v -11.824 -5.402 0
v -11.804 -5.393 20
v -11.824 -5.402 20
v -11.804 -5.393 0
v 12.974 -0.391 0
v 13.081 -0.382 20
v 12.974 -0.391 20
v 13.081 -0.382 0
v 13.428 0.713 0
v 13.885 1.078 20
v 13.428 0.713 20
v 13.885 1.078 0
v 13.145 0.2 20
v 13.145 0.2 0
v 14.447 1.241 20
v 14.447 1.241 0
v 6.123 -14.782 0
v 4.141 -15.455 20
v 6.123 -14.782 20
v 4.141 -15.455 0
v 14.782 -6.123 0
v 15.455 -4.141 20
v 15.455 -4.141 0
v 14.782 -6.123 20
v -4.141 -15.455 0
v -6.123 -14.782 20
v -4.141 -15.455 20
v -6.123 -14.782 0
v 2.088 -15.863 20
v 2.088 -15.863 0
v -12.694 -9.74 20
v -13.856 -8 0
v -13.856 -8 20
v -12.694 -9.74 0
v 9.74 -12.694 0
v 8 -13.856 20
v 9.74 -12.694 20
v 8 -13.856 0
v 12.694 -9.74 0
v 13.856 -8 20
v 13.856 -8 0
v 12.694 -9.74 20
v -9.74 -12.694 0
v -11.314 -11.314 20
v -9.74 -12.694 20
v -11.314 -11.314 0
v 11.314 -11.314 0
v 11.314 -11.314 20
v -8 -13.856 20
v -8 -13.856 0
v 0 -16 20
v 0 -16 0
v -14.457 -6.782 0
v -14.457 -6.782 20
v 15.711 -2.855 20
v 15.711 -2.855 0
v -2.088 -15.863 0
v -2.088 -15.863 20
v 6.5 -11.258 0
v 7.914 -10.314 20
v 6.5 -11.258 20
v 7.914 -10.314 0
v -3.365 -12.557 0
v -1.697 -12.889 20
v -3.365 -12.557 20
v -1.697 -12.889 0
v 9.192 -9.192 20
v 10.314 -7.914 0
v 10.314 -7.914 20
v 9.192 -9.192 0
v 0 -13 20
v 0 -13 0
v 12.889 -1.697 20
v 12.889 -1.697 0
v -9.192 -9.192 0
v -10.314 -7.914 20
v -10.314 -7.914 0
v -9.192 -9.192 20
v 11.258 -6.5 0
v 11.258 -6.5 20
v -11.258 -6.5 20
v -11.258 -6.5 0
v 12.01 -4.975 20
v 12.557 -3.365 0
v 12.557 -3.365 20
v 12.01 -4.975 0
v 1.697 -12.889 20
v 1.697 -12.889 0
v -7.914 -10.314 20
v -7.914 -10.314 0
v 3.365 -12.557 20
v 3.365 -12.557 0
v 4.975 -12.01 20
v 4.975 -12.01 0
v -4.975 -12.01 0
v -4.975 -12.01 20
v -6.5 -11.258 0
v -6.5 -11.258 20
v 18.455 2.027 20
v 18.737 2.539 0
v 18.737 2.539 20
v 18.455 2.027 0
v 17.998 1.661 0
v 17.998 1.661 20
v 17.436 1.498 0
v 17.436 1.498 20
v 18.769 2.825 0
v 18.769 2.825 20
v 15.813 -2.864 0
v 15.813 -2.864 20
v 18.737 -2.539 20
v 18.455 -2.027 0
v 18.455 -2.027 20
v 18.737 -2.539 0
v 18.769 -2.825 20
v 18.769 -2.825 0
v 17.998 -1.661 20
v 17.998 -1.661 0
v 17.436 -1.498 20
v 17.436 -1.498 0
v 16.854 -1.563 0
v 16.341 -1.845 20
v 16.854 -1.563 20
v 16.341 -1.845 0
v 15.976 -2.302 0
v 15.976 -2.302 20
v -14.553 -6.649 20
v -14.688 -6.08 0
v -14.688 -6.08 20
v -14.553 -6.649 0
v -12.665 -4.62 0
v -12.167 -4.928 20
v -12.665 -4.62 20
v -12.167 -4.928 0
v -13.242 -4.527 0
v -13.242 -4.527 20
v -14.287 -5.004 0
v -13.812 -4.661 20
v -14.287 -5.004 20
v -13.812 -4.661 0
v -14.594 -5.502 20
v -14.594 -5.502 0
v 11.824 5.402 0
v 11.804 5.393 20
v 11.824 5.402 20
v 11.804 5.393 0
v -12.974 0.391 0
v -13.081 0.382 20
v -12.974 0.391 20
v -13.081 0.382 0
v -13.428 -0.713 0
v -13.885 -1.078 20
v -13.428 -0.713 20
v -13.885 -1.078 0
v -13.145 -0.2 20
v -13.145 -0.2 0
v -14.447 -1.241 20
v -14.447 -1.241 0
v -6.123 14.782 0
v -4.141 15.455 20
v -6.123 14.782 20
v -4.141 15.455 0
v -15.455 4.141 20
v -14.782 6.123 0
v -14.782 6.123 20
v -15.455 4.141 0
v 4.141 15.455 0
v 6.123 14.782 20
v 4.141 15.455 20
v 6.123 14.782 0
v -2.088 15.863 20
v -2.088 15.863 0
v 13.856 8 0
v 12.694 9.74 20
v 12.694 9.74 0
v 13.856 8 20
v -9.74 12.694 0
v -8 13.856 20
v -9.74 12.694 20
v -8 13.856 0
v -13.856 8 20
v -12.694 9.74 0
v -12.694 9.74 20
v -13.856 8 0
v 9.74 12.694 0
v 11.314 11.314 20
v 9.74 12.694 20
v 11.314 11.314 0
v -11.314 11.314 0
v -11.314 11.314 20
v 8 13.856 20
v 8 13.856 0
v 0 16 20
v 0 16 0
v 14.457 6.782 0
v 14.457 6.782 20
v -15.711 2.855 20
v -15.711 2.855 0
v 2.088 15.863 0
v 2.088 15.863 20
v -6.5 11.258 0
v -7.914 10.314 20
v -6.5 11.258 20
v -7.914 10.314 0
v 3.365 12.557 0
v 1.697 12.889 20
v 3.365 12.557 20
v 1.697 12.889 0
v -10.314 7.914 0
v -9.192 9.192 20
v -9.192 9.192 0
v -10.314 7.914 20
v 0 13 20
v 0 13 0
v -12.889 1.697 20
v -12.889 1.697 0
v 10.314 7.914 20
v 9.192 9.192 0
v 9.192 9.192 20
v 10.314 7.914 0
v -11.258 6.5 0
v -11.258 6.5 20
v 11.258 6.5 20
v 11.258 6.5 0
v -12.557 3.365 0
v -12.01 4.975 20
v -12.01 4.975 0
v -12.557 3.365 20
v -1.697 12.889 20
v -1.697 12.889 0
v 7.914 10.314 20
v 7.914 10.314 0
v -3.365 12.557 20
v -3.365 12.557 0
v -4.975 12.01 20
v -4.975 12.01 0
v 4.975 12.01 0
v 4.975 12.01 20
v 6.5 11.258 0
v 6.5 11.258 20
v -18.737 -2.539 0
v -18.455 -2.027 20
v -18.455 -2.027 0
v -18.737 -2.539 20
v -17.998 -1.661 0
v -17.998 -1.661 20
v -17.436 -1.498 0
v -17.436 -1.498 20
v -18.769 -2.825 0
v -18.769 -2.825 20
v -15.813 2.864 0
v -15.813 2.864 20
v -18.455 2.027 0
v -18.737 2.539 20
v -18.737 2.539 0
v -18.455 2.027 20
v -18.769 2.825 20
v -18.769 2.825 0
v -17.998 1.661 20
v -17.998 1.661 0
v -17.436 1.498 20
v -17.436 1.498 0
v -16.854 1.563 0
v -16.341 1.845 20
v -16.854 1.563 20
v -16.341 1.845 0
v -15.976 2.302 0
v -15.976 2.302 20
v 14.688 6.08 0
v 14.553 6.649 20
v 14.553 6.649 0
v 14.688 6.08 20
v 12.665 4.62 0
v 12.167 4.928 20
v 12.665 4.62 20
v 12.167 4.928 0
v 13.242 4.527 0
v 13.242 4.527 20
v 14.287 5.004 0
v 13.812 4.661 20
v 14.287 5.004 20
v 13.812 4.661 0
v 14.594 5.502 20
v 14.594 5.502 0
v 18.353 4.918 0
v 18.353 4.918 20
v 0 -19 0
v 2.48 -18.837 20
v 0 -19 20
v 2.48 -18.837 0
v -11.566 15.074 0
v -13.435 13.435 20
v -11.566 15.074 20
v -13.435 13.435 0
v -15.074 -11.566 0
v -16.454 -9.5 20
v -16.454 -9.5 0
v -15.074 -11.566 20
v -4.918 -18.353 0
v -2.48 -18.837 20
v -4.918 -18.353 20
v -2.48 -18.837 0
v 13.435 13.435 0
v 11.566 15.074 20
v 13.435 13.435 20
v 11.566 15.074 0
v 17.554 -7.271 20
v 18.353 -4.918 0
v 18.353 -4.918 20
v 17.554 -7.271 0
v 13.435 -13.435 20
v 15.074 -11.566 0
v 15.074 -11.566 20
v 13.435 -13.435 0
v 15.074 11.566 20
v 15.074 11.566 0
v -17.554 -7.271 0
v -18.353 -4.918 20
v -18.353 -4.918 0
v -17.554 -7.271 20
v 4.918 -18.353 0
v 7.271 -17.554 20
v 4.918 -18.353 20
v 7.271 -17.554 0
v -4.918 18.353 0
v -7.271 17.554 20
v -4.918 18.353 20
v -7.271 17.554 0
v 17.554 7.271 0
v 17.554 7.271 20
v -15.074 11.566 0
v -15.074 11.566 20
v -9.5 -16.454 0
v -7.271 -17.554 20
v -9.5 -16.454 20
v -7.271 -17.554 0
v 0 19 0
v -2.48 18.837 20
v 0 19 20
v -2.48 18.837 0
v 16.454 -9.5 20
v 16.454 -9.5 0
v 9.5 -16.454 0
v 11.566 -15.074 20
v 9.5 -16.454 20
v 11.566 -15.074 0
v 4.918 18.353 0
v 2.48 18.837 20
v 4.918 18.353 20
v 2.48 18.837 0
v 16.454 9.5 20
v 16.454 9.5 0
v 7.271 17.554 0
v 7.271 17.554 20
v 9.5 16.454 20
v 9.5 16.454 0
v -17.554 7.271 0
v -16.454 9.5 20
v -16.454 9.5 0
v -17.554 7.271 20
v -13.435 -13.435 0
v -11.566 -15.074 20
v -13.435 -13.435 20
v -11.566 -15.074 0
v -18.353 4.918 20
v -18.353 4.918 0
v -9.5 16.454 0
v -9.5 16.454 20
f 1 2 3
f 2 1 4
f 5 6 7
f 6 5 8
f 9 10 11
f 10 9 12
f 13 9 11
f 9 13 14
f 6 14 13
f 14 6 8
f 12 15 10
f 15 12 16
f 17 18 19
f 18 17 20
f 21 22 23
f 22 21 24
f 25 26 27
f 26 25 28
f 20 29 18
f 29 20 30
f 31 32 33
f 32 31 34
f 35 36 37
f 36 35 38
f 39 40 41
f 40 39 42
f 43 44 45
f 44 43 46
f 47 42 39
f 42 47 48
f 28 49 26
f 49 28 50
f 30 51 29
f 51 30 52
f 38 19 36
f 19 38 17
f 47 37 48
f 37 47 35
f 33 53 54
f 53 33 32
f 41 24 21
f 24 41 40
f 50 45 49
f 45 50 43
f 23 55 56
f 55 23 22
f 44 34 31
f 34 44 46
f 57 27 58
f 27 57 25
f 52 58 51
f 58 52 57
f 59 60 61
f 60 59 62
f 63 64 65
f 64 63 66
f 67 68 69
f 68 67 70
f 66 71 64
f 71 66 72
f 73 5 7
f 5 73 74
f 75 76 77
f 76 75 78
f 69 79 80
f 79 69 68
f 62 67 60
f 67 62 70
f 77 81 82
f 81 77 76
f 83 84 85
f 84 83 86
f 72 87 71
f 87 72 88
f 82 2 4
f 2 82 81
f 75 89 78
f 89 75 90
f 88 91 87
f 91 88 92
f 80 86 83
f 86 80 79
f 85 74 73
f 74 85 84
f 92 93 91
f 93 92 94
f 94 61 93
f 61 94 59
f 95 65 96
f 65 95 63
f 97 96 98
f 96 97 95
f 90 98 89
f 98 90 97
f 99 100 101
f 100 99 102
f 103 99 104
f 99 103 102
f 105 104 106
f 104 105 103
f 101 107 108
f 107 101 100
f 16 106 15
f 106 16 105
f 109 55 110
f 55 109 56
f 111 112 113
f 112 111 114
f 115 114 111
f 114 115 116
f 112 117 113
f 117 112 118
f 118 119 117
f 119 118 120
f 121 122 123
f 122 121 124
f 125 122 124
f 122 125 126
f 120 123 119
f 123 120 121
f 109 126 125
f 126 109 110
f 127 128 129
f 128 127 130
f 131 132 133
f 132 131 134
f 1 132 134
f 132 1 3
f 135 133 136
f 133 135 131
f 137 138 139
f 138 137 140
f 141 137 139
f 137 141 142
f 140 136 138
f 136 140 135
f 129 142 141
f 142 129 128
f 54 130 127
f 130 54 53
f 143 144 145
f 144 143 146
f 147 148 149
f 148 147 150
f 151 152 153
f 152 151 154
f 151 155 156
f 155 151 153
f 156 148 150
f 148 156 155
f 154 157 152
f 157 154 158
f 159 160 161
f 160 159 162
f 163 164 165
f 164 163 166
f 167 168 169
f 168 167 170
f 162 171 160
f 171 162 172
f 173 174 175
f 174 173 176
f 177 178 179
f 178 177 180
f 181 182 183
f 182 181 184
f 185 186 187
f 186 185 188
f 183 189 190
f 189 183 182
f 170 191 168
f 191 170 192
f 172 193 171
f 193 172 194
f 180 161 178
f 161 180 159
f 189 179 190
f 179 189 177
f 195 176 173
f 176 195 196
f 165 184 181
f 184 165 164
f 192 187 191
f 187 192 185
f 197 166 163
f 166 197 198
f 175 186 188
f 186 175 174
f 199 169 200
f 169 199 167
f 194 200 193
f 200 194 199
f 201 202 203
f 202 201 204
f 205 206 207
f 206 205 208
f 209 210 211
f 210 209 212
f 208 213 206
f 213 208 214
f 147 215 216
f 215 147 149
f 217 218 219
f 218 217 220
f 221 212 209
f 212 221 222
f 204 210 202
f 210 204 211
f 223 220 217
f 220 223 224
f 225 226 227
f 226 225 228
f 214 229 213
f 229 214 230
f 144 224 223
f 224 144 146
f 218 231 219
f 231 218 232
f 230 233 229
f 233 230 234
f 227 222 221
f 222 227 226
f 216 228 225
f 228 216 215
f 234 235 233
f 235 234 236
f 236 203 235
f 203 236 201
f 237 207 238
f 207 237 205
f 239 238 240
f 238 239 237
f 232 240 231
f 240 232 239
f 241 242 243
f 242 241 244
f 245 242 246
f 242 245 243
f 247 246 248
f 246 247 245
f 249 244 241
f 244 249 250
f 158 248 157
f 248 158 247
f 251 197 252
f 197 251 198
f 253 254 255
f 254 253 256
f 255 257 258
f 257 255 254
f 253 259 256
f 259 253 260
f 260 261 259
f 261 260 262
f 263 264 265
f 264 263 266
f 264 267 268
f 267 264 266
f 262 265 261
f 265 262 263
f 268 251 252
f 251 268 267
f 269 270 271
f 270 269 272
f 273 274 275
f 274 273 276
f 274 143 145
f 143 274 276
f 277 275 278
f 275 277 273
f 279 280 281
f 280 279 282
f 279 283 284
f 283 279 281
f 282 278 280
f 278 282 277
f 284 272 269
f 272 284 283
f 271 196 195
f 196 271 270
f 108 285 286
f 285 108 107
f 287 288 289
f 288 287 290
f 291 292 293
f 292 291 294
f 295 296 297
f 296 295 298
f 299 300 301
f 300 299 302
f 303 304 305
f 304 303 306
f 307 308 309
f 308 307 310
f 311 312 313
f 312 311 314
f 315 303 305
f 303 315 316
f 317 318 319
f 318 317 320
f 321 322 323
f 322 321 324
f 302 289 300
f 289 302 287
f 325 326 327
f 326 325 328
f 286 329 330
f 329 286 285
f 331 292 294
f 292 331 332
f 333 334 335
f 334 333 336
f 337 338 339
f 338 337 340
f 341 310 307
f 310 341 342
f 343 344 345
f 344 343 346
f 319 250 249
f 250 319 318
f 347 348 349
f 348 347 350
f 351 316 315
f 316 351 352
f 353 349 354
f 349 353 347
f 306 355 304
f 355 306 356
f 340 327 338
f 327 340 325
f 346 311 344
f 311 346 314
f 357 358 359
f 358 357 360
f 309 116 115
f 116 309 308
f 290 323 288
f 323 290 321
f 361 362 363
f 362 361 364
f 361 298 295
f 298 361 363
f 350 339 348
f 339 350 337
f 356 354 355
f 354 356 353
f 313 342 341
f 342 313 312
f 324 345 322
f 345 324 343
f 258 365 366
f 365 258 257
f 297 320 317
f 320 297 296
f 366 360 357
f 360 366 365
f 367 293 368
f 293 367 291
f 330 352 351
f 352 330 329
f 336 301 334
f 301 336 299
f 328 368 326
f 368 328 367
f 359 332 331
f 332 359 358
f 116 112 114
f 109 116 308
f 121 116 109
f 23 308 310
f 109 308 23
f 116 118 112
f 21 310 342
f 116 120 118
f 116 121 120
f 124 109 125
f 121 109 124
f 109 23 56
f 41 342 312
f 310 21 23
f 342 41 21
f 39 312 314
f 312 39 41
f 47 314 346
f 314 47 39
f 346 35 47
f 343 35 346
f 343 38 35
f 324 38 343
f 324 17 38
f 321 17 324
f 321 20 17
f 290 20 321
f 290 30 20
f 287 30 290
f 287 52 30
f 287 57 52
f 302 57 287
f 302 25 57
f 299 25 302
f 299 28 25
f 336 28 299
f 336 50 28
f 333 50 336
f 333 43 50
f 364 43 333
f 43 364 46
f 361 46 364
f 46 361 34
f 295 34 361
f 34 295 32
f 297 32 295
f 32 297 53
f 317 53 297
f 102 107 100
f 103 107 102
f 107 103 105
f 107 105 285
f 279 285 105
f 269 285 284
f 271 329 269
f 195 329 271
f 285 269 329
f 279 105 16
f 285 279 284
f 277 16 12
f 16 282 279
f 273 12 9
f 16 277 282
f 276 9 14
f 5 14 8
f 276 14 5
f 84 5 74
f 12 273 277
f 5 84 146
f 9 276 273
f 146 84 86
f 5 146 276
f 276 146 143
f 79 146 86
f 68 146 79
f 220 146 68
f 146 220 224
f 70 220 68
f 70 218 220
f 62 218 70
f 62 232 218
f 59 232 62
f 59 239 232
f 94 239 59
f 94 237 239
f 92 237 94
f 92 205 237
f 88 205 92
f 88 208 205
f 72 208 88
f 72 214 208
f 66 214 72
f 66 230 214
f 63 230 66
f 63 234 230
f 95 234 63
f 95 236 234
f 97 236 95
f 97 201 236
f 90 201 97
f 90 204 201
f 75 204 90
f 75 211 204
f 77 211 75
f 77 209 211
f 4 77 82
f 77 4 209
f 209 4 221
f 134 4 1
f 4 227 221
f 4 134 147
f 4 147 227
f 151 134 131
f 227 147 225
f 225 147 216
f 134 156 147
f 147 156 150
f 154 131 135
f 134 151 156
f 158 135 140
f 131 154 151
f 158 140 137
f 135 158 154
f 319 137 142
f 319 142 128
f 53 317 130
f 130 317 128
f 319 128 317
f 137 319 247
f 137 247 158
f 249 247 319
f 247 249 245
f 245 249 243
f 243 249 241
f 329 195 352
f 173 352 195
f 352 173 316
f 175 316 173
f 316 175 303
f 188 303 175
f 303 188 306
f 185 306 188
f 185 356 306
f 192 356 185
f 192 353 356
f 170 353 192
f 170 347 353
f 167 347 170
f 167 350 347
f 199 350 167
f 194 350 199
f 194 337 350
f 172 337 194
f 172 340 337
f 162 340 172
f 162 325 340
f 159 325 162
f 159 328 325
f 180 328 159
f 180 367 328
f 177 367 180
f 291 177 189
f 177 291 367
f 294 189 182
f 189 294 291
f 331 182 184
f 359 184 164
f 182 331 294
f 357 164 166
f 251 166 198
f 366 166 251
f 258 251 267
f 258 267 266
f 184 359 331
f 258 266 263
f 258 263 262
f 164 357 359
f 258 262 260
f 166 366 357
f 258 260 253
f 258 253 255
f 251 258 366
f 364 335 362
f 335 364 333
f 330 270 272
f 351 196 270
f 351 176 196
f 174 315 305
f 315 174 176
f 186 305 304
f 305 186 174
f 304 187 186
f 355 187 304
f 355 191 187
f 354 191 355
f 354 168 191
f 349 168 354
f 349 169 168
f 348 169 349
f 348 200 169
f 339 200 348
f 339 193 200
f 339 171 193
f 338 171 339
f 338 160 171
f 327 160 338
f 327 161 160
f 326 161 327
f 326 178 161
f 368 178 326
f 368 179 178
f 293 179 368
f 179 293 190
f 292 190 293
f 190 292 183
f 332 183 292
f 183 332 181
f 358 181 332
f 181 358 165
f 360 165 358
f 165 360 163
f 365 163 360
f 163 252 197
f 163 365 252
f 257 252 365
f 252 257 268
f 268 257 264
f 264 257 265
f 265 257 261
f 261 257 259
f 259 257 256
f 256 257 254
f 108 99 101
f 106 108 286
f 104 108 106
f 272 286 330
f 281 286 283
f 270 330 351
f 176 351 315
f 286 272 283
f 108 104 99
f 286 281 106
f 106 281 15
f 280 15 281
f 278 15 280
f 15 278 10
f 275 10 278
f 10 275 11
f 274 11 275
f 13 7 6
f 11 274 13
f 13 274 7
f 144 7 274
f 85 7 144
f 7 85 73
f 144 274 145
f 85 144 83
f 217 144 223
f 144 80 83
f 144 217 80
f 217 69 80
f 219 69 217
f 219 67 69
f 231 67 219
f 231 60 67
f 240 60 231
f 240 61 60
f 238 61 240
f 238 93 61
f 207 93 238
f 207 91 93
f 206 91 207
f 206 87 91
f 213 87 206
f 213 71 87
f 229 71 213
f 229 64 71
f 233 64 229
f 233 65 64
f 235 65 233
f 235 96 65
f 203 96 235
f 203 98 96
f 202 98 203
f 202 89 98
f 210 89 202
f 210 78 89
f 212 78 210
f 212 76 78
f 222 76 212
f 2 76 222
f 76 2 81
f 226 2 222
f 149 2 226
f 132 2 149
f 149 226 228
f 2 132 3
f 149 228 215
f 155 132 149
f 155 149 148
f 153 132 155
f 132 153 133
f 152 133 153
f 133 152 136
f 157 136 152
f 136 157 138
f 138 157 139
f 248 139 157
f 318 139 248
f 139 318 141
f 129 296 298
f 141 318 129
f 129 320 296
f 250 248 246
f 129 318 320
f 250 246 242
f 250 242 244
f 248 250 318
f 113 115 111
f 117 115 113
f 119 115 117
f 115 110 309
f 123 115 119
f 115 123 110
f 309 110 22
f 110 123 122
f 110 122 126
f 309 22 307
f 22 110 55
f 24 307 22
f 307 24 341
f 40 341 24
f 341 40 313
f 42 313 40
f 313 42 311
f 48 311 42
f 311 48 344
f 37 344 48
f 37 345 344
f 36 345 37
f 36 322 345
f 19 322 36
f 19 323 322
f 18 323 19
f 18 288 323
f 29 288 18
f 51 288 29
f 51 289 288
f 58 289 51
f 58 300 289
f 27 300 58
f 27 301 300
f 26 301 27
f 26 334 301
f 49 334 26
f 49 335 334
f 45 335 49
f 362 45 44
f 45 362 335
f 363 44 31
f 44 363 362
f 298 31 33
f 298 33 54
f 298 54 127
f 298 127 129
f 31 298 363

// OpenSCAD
FN = 48;  // 48, 96
TL = 0.3; // Tolerance
KH = 20;  // Knob Height
CH = 2;   // Chamfer
H = 67;   // Box inside height
W = 35;   // Box inside width
S = 100;  // Screw distance
WALL = 3;   // Wall Thickness

/*
knobFlexiCut();
*/
knob();

module knobFlexiCut() {
	h = KH + 2;
	r = (W + WALL) / 2;    // Outer knob radius
	A = r2d(WALL / (W/2)); // Angle for one wall thinckness
	a = A * 2.5;           // Angle for quadrant 3
	b = A / 2;             // Angle for notch cutters
	translate([0, 0, -1])
	union() {
		difference() {
			// Outer
			cylinder(r=r-WALL, h=h, $fn=FN);

			// Inner
			cylinder(r=r-WALL-WALL, h=h*2+1, $fn=FN, center=true);

			translate([0, 0, -1]) {
				// Cut off quadrant 1
				rotate([0, 0, b]) cube([r, r, h+2]);
				// Cut off quadrant 2
				rotate([0, 0, 89]) cube([r, r, h+2]);
				// Cut off some quadrant 3
				rotate([0, 0, 90+a]) cube([r, r, h+2]);
			}

			// Right rounder
			rotate([0, 0, b])
				translate([r-WALL-WALL/2, -WALL/2, -1])
					difference() {
						translate([-WALL, 0, -2])
							cube([WALL, WALL, h+4]);
						cylinder(r=WALL/2, h=h+2, $fn=FN/3);
					}
		};

		// Left rounder
		rotate([0,0,a])
			translate([-r+WALL+WALL/2, 0, 0])
				cylinder(r=WALL/2, h=h, $fn=FN/3);

		// Upper right notch cutter
		rotate([0, 0, b])
			translate([r-WALL-WALL, -WALL, 0]) {
				translate([WALL/2, WALL/2, 0])
					cube([WALL*2, WALL/2, h]); // Horizontal line
				difference() { // Upper right quarter pipe
					translate([WALL*1.5, WALL/2, 0])
						cube([WALL, WALL, h]);
					translate([WALL*3/2, WALL*1.5, -1])
						cylinder(r=WALL/2, h=h+2, $fn=FN/3);
				}
			}

		// Striaght right notch cutter
		translate([r-WALL-WALL/2, -WALL/4, 0])
			cube([WALL*2, WALL/2, h]);

		// Lower right notch cutter
		rotate([0, 0, -b])
			translate([r-WALL-WALL, 0, 0])
				difference() {
					translate([WALL/2, -WALL/2, 0])
						cube([WALL*2, WALL, h]);
					translate([WALL*3/2, -WALL/2, -1])
						cylinder(r=WALL/2, h=h+2, $fn=FN/3);
				}
	}
}

module knob() {
	r = (W + WALL)/ 2;

	difference() {
		// Outer surface
		cylinder(r=r, h=KH, $fn=FN);

		// Chamfer
		/*
		translate([0, 0, KH - CH])
			difference() {
				// Main
				cylinder(r=r, h=CH, $fn=FN);

				// Inner
				cylinder(r=r-CH, h=CH*2, $fn=FN);

				// Curve
				torus(ri=CH, ro=r-CH, $fni=FN/4, $fno=FN);
			};
		*/

		// Flexible cutouts
		knobFlexiCut();

		rotate([0,0,180])
			knobFlexiCut();
	}
}

function r2d(radians) = radians * 180 / PI;
function d2r(degrees) = degrees * PI / 180;
